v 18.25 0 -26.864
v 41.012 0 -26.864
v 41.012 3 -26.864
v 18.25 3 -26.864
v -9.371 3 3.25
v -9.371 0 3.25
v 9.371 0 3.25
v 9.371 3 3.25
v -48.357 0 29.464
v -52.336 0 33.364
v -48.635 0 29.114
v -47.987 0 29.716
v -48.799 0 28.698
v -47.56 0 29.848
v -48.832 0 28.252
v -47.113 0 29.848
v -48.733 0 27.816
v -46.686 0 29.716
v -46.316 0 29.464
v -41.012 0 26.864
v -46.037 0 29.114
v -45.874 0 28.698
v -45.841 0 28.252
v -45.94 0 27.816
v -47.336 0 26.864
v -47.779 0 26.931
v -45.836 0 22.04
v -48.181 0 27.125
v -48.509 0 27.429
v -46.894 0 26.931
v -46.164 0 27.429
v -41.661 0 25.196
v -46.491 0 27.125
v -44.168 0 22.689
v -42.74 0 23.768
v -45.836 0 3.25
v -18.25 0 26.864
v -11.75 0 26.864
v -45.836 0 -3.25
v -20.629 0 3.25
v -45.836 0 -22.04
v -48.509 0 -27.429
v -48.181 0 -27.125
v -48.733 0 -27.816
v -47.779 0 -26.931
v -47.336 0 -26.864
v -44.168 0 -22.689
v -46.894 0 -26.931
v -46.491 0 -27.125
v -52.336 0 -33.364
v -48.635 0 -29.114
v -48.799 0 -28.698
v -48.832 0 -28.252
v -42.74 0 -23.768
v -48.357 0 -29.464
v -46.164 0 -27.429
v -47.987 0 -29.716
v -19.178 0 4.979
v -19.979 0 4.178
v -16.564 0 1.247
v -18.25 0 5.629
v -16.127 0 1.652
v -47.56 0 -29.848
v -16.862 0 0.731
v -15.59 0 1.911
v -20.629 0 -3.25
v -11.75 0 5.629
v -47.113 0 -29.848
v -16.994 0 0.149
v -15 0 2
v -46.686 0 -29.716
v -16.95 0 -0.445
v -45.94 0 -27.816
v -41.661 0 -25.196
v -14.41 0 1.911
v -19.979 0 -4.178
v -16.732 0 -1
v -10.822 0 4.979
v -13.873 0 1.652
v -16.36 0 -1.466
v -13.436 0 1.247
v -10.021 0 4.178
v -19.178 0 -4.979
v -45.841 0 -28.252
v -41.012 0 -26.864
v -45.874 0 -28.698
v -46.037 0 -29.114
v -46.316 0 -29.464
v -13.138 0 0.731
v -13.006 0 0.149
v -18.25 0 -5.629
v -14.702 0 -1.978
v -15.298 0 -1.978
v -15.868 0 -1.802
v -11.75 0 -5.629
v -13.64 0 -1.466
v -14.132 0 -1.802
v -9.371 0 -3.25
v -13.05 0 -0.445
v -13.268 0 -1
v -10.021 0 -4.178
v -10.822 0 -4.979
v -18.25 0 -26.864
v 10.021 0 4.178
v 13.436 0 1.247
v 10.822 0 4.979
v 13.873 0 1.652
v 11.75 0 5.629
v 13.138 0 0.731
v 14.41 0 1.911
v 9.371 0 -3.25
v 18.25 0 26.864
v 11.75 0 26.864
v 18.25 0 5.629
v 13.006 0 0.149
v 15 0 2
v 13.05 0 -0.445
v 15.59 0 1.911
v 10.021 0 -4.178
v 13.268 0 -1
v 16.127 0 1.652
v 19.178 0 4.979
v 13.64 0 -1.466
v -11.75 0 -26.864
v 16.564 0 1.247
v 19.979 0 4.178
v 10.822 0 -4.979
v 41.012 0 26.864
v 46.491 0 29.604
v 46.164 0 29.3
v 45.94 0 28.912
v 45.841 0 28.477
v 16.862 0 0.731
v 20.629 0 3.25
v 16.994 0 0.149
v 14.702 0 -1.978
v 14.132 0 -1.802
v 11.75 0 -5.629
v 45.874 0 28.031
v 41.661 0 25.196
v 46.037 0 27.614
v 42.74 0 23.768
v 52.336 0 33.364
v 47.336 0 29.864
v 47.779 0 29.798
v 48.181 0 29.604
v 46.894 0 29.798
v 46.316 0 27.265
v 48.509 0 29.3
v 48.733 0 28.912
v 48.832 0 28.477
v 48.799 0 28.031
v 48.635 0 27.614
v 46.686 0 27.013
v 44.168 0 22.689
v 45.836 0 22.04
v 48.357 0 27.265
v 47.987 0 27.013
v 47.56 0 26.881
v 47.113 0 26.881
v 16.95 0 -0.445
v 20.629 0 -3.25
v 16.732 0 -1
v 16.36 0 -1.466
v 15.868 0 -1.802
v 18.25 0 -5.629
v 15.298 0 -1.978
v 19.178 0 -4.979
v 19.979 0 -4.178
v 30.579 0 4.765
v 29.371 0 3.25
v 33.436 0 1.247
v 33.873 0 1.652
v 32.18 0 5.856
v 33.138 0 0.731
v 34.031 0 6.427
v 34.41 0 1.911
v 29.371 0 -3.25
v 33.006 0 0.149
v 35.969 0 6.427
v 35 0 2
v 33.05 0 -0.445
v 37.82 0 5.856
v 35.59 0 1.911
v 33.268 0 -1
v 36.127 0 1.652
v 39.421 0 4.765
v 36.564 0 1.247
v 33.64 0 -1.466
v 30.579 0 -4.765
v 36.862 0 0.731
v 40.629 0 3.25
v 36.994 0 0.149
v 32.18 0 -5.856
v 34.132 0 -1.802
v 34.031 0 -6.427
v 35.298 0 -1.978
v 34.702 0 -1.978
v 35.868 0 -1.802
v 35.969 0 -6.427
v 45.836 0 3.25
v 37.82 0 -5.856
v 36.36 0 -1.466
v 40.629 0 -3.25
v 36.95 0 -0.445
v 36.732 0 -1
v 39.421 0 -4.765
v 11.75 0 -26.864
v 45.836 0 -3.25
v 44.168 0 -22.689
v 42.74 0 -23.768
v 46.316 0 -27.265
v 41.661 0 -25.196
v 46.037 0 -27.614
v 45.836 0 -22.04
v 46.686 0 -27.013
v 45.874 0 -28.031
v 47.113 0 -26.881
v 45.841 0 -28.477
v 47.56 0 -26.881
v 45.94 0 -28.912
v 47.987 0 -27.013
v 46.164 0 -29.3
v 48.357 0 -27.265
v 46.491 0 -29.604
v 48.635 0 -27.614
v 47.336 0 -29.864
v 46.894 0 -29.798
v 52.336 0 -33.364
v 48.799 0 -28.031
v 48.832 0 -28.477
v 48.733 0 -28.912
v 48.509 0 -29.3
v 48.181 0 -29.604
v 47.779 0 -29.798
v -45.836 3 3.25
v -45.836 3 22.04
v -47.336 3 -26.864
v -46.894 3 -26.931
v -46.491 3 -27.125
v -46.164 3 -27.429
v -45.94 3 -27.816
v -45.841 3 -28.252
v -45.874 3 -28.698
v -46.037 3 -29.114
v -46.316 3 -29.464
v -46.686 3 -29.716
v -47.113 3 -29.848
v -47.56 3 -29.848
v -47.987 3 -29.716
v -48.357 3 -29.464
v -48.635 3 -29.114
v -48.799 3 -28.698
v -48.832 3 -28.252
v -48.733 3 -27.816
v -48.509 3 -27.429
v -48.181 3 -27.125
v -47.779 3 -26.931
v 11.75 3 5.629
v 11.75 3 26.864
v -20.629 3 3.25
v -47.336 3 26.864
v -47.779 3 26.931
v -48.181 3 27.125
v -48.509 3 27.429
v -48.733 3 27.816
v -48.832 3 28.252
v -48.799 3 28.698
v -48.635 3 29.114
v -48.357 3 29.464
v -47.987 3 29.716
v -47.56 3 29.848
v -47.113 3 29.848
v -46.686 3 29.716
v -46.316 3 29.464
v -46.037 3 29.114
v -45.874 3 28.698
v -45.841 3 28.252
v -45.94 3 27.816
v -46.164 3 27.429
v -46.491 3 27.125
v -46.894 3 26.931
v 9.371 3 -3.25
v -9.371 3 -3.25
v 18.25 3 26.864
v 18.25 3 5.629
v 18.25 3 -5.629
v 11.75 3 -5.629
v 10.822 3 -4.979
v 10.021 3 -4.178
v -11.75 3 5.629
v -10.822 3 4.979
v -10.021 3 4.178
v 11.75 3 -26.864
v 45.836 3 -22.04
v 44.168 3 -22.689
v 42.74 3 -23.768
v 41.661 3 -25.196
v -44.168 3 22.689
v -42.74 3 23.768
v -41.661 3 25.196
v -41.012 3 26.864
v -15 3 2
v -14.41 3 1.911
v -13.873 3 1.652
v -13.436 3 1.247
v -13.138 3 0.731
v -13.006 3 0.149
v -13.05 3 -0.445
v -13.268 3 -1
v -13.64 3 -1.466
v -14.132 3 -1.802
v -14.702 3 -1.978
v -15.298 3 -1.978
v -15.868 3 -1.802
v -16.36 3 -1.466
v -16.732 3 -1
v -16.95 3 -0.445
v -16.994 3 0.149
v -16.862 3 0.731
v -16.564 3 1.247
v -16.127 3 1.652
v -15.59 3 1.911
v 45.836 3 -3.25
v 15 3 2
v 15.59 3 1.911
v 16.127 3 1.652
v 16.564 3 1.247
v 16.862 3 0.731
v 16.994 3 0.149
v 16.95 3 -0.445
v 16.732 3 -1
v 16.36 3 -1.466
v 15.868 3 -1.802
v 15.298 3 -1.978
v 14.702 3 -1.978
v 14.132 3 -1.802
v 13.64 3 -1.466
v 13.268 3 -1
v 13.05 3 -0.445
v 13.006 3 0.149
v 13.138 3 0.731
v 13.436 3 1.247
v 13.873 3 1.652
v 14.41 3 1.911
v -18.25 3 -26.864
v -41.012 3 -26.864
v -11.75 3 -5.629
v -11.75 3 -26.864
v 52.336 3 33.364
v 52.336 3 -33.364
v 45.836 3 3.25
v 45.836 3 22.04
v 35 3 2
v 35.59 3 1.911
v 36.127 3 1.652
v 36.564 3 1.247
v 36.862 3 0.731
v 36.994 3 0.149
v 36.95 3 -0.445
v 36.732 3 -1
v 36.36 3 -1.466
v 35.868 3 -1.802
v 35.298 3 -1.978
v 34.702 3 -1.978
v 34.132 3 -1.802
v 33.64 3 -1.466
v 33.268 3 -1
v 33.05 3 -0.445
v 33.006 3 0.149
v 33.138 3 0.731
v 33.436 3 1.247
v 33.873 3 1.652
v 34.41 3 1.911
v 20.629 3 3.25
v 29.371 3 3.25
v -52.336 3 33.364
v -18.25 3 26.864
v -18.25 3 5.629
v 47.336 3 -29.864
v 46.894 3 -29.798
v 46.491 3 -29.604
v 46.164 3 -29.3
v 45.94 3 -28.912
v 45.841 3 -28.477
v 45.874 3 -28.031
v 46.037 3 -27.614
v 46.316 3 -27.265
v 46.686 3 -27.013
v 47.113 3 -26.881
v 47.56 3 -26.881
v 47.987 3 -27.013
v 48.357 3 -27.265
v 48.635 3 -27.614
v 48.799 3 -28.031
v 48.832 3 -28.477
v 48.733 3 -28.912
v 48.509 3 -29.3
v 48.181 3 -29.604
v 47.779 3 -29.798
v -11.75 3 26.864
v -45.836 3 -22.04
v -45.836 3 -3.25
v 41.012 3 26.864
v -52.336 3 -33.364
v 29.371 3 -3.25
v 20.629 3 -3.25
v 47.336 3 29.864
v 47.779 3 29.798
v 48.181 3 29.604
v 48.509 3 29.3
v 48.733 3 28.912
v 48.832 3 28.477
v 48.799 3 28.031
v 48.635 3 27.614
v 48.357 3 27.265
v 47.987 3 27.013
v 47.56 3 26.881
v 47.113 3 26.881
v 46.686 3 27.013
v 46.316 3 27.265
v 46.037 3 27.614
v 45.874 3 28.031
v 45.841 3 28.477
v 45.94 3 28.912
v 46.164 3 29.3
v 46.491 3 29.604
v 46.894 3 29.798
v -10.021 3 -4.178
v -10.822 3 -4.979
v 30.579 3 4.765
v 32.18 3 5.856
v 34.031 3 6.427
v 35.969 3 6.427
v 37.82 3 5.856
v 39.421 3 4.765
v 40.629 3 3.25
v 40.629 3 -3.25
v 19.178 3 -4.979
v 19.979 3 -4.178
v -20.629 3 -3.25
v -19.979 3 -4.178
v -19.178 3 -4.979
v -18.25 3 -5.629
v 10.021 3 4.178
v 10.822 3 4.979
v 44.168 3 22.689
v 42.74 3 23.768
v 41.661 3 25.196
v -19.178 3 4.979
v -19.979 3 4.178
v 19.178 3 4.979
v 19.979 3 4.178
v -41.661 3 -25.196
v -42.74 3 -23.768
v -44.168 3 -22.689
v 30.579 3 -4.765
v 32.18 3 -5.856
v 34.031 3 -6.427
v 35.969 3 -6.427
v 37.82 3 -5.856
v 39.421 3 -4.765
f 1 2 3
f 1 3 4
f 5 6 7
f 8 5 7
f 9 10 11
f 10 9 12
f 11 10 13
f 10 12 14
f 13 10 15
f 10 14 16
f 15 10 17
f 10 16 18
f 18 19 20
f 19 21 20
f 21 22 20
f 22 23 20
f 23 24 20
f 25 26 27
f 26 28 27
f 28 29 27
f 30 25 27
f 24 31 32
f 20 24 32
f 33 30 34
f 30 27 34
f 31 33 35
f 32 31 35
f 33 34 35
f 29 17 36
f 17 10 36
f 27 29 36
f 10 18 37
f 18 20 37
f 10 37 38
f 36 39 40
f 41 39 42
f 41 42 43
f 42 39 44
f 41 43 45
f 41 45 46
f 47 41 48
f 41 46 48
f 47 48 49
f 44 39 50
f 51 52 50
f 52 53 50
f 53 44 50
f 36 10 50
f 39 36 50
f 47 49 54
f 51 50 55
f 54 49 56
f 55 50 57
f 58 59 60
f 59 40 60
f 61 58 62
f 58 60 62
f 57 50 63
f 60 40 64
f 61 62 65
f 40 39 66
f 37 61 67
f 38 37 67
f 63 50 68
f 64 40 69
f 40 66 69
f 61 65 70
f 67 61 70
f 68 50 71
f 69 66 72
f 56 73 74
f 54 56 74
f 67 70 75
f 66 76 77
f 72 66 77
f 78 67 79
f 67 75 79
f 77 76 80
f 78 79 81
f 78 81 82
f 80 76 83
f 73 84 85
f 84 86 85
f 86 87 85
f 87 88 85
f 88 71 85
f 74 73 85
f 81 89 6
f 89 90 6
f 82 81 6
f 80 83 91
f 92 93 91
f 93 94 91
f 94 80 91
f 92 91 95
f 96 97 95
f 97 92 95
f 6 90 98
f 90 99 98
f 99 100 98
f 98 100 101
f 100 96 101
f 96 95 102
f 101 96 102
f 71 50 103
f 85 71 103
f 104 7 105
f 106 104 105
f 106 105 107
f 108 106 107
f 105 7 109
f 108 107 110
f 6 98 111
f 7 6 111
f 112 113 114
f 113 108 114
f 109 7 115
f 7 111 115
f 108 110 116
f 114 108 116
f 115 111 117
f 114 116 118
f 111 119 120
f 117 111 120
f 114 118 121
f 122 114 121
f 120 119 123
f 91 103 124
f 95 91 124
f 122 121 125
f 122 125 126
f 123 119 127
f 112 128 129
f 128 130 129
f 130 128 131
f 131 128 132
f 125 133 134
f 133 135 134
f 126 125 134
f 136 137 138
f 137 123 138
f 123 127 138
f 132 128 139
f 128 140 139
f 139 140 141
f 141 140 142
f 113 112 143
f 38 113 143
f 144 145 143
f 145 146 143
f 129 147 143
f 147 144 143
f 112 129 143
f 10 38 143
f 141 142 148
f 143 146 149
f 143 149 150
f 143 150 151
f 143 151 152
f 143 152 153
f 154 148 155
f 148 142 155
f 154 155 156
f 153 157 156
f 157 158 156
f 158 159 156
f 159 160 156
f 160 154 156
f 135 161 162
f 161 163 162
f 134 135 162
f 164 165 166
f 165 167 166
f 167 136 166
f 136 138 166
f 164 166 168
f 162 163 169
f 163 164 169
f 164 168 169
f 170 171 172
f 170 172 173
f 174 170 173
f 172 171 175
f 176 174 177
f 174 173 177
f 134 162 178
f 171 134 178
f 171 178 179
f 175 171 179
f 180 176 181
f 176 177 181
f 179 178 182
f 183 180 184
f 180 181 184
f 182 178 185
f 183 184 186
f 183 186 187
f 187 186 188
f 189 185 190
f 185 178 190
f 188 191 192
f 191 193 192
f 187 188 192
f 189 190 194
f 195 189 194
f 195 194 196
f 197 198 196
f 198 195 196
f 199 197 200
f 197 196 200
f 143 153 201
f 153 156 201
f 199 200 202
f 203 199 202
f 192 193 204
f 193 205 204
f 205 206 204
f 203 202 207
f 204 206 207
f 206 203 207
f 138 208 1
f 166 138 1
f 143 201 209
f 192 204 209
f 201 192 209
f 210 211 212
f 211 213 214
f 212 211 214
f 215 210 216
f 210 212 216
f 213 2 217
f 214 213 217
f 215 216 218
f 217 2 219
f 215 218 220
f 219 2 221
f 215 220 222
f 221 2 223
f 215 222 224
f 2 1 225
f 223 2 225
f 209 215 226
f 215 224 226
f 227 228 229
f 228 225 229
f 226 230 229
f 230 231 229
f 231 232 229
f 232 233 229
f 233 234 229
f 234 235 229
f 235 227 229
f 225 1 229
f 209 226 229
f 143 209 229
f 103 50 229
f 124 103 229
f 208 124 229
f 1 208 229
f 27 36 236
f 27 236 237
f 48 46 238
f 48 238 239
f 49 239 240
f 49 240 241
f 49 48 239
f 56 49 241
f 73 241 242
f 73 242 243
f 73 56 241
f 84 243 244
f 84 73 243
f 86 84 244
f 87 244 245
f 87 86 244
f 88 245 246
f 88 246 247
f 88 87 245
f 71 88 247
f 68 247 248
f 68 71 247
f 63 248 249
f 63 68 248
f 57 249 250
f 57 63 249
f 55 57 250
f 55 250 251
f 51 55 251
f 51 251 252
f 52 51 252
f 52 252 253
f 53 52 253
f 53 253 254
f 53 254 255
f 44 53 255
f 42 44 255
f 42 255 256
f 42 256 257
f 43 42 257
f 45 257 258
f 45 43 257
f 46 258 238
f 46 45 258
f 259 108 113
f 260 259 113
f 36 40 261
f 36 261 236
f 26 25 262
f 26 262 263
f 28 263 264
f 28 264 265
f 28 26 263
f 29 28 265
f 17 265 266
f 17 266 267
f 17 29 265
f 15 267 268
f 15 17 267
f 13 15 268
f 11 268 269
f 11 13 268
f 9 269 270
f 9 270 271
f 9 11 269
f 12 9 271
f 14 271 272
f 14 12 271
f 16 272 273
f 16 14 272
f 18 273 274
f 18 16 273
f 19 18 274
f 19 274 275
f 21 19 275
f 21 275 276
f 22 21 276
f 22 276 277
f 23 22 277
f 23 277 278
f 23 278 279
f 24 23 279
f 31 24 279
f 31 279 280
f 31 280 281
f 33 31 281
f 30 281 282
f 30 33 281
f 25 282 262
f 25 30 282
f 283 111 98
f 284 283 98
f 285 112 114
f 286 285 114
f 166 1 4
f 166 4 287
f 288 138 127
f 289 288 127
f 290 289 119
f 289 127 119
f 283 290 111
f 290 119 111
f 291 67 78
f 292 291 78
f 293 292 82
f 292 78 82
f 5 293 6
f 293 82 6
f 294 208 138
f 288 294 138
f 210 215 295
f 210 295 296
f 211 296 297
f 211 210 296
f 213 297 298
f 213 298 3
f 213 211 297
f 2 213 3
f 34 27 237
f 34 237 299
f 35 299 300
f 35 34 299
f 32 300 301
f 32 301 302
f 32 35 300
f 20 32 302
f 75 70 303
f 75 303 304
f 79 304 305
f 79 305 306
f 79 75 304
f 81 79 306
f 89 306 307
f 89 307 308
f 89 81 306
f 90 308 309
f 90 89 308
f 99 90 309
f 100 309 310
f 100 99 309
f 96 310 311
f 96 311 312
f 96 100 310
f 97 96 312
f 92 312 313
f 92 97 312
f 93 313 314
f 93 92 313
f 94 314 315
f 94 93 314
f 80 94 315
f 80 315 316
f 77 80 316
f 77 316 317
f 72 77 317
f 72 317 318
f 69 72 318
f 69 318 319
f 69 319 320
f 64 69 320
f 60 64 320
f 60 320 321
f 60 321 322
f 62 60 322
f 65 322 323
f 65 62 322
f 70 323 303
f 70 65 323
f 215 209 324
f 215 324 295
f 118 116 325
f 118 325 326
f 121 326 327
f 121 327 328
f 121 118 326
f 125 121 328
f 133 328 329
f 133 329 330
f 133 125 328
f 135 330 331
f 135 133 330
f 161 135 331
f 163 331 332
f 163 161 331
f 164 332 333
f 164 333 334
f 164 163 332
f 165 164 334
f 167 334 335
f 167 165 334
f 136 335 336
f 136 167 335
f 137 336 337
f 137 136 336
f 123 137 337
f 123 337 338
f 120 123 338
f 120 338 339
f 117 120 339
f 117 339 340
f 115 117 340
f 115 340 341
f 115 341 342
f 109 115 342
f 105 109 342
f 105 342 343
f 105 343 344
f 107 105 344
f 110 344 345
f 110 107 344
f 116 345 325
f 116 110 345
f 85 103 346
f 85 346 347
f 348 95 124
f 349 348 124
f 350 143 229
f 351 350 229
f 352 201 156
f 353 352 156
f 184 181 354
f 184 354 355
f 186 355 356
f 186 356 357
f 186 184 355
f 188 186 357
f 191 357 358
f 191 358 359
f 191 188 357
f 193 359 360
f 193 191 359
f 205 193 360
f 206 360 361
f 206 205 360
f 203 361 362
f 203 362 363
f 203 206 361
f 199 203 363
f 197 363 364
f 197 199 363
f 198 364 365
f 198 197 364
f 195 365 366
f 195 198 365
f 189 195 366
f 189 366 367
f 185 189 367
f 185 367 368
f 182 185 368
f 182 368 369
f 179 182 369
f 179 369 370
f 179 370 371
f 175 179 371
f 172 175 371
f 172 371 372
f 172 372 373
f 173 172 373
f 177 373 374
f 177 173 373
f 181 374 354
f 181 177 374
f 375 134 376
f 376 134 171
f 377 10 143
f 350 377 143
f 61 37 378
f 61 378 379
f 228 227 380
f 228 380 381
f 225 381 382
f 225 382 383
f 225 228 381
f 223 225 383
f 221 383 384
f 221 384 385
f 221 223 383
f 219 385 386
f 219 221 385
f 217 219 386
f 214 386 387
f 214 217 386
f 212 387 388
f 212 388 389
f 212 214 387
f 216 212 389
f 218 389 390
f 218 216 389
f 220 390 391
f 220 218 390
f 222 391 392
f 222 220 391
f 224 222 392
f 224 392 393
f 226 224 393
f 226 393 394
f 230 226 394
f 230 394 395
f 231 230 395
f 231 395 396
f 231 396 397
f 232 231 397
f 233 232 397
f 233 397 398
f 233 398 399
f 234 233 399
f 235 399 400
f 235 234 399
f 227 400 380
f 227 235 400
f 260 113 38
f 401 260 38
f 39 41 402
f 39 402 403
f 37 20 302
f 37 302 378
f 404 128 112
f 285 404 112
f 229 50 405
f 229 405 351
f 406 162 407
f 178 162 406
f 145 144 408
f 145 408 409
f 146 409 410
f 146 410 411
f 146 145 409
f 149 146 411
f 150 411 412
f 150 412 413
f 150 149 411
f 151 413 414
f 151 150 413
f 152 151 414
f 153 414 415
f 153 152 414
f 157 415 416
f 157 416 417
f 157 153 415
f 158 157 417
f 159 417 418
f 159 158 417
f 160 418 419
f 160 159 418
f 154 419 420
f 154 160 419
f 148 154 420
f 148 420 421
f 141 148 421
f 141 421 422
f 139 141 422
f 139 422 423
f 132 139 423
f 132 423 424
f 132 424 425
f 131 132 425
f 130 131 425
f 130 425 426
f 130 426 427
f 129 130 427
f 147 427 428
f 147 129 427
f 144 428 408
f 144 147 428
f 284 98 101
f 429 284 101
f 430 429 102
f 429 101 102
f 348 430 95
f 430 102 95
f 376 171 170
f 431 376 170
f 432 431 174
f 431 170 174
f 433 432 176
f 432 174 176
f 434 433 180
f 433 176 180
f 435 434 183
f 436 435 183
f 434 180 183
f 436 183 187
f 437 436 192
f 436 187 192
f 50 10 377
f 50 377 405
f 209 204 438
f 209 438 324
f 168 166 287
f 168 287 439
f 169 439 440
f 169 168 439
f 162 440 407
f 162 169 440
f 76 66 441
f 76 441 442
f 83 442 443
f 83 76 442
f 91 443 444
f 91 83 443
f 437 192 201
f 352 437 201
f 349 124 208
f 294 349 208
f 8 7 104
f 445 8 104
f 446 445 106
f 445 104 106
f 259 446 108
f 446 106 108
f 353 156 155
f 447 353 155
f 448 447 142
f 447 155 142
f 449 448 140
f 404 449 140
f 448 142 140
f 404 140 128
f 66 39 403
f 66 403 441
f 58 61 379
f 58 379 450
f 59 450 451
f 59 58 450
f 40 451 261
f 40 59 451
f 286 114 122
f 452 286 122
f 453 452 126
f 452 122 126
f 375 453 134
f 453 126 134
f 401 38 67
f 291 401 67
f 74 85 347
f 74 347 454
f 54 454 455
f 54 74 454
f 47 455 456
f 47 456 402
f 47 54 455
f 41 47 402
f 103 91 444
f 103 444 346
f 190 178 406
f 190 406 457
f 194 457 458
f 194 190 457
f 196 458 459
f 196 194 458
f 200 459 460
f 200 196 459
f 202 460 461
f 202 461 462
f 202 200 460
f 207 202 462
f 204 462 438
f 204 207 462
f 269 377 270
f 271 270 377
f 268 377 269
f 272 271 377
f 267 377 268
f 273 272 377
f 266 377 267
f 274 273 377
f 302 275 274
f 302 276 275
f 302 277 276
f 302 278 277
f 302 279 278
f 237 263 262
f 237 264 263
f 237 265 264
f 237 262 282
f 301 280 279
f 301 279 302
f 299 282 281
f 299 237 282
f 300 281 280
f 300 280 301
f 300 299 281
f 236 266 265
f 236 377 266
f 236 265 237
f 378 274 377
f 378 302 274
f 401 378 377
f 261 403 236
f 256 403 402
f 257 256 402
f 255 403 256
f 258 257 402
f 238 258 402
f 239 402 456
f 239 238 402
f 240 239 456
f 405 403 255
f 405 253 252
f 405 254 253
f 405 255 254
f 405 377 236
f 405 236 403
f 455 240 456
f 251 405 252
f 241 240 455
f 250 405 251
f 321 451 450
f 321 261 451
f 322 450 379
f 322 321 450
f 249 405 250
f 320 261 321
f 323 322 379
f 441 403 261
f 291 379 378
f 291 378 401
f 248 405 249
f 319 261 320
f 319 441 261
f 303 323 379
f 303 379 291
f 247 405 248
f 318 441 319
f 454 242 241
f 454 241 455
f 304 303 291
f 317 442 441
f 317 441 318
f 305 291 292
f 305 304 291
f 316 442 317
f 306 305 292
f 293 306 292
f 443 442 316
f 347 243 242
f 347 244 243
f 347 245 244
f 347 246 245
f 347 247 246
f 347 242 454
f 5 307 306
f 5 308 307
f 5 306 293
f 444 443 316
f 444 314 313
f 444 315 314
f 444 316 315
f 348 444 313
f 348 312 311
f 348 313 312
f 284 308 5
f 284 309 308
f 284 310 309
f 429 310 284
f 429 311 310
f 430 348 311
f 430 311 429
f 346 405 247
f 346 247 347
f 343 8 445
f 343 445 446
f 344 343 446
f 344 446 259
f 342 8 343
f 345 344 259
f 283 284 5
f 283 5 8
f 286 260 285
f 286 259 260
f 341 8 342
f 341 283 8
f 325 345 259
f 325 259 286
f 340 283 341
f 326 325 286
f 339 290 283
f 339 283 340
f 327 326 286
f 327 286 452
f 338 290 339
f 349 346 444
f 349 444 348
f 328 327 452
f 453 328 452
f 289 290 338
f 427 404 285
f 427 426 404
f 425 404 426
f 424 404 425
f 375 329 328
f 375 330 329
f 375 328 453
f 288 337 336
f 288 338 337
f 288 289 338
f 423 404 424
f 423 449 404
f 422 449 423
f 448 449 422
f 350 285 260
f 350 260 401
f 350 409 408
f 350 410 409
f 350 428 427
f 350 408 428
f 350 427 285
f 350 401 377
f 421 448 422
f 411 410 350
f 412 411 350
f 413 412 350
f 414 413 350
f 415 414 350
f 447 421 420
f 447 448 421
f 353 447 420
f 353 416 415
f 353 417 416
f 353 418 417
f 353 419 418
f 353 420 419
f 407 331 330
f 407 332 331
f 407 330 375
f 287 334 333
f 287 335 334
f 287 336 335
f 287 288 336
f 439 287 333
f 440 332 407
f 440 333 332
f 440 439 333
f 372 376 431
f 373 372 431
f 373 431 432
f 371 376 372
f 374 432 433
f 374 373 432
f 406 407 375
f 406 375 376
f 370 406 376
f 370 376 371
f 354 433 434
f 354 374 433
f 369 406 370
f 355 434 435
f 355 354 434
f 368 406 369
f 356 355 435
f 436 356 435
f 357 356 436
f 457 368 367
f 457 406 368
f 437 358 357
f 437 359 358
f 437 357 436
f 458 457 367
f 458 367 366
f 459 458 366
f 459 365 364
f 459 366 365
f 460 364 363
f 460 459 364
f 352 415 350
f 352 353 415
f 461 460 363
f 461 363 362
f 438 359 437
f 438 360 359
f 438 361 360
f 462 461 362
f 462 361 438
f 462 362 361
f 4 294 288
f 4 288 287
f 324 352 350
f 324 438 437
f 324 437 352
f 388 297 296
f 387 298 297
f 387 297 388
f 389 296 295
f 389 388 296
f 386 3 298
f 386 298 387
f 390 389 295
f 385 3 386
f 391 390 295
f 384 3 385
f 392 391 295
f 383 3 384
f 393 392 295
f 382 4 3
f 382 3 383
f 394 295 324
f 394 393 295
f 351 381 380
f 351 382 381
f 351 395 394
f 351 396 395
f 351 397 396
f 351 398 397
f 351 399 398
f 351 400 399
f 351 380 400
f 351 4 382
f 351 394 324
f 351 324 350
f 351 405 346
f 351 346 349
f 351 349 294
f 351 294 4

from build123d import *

# Parameters (mm, degrees)
SKETCH1_W           = 104.672897196
SKETCH1_H           = 66.728971962
SKETCH1_R           = 2
SKETCH1_R_2         = 1.5
BOSS_EXTRUDE1_DEPTH = 3


with BuildPart() as part:
    # Sketch1 → Boss-Extrude1 (new body)
    with BuildSketch(Plane(origin=(0, 0, 0), x_dir=(1, 0, 0), z_dir=(0, 1, 0))):
        Rectangle(SKETCH1_W, SKETCH1_H)
        with Locations(Location((35, 0, 0), (0, 0, 270))):
            Circle(SKETCH1_R, mode=Mode.SUBTRACT)
        with Locations(Location((15, 0, 0), (0, 0, 270))):
            Circle(SKETCH1_R, mode=Mode.SUBTRACT)
        with Locations(Location((-15, 0, 0), (0, 0, 270))):
            Circle(SKETCH1_R, mode=Mode.SUBTRACT)
        with Locations(Location((-47.336448598, 28.364485981, 0), (0, 0, 270))):
            Circle(SKETCH1_R_2, mode=Mode.SUBTRACT)
        with Locations(Location((47.336448598, 28.364485981, 0), (0, 0, 90))):
            Circle(SKETCH1_R_2, mode=Mode.SUBTRACT)
        with Locations(Location((-47.336448598, -28.364485981, 0), (0, 0, 90))):
            Circle(SKETCH1_R_2, mode=Mode.SUBTRACT)
        with Locations(Location((47.336448598, -28.364485981, 0), (0, 0, 270))):
            Circle(SKETCH1_R_2, mode=Mode.SUBTRACT)
        with BuildLine():
            Line((40.629165125, -3.25), (45.836448598, -3.25))
            Line((45.836448598, -3.25), (45.836448598, -22.039930661))
            ThreePointArc((45.836448598, -22.039930661), (42.74025452, -23.768291904), (41.011893278, -26.864485981))
            Line((41.011893278, -26.864485981), (18.25, -26.864485981))
            Line((18.25, -26.864485981), (18.25, -5.629165125))
            ThreePointArc((18.25, -5.629165125), (19.596194078, -4.596194078), (20.629165125, -3.25))
            Line((20.629165125, -3.25), (29.370834875, -3.25))
            ThreePointArc((29.370834875, -3.25), (35, -6.5), (40.629165125, -3.25))
        make_face(mode=Mode.SUBTRACT)
        with BuildLine():
            Line((-18.25, -26.864485981), (-18.25, -5.629165125))
            ThreePointArc((-18.25, -5.629165125), (-19.596194078, -4.596194078), (-20.629165125, -3.25))
            Line((-20.629165125, -3.25), (-45.836448598, -3.25))
            Line((-45.836448598, -3.25), (-45.836448598, -22.039930661))
            ThreePointArc((-45.836448598, -22.039930661), (-42.74025452, -23.768291904), (-41.011893278, -26.864485981))
            Line((-41.011893278, -26.864485981), (-18.25, -26.864485981))
        make_face(mode=Mode.SUBTRACT)
        with BuildLine():
            Line((-11.75, -26.864485981), (-11.75, -5.629165125))
            ThreePointArc((-11.75, -5.629165125), (-10.403805922, -4.596194078), (-9.370834875, -3.25))
            Line((-9.370834875, -3.25), (9.370834875, -3.25))
            ThreePointArc((9.370834875, -3.25), (10.403805922, -4.596194078), (11.75, -5.629165125))
            Line((11.75, -5.629165125), (11.75, -26.864485981))
            Line((11.75, -26.864485981), (-11.75, -26.864485981))
        make_face(mode=Mode.SUBTRACT)
        with BuildLine():
            Line((40.629165125, 3.25), (45.836448598, 3.25))
            Line((45.836448598, 3.25), (45.836448598, 22.039930661))
            ThreePointArc((45.836448598, 22.039930661), (42.74025452, 23.768291904), (41.011893278, 26.864485981))
            Line((41.011893278, 26.864485981), (18.25, 26.864485981))
            Line((18.25, 26.864485981), (18.25, 5.629165125))
            ThreePointArc((18.25, 5.629165125), (19.596194078, 4.596194078), (20.629165125, 3.25))
            Line((20.629165125, 3.25), (29.370834875, 3.25))
            ThreePointArc((29.370834875, 3.25), (35, 6.5), (40.629165125, 3.25))
        make_face(mode=Mode.SUBTRACT)
        with BuildLine():
            Line((-11.75, 26.864485981), (11.75, 26.864485981))
            Line((11.75, 26.864485981), (11.75, 5.629165125))
            ThreePointArc((11.75, 5.629165125), (10.403805922, 4.596194078), (9.370834875, 3.25))
            Line((9.370834875, 3.25), (-9.370834875, 3.25))
            ThreePointArc((-9.370834875, 3.25), (-10.403805922, 4.596194078), (-11.75, 5.629165125))
            Line((-11.75, 5.629165125), (-11.75, 26.864485981))
        make_face(mode=Mode.SUBTRACT)
        with BuildLine():
            Line((-45.836448598, 3.25), (-20.629165125, 3.25))
            ThreePointArc((-20.629165125, 3.25), (-19.596194078, 4.596194078), (-18.25, 5.629165125))
            Line((-18.25, 5.629165125), (-18.25, 26.864485981))
            Line((-18.25, 26.864485981), (-41.011893278, 26.864485981))
            ThreePointArc((-41.011893278, 26.864485981), (-42.74025452, 23.768291904), (-45.836448598, 22.039930661))
            Line((-45.836448598, 22.039930661), (-45.836448598, 6.771875217))
            Line((-45.836448598, 6.771875217), (-45.836448598, 3.25))
        make_face(mode=Mode.SUBTRACT)
    extrude(amount=BOSS_EXTRUDE1_DEPTH)


solid = part.part
